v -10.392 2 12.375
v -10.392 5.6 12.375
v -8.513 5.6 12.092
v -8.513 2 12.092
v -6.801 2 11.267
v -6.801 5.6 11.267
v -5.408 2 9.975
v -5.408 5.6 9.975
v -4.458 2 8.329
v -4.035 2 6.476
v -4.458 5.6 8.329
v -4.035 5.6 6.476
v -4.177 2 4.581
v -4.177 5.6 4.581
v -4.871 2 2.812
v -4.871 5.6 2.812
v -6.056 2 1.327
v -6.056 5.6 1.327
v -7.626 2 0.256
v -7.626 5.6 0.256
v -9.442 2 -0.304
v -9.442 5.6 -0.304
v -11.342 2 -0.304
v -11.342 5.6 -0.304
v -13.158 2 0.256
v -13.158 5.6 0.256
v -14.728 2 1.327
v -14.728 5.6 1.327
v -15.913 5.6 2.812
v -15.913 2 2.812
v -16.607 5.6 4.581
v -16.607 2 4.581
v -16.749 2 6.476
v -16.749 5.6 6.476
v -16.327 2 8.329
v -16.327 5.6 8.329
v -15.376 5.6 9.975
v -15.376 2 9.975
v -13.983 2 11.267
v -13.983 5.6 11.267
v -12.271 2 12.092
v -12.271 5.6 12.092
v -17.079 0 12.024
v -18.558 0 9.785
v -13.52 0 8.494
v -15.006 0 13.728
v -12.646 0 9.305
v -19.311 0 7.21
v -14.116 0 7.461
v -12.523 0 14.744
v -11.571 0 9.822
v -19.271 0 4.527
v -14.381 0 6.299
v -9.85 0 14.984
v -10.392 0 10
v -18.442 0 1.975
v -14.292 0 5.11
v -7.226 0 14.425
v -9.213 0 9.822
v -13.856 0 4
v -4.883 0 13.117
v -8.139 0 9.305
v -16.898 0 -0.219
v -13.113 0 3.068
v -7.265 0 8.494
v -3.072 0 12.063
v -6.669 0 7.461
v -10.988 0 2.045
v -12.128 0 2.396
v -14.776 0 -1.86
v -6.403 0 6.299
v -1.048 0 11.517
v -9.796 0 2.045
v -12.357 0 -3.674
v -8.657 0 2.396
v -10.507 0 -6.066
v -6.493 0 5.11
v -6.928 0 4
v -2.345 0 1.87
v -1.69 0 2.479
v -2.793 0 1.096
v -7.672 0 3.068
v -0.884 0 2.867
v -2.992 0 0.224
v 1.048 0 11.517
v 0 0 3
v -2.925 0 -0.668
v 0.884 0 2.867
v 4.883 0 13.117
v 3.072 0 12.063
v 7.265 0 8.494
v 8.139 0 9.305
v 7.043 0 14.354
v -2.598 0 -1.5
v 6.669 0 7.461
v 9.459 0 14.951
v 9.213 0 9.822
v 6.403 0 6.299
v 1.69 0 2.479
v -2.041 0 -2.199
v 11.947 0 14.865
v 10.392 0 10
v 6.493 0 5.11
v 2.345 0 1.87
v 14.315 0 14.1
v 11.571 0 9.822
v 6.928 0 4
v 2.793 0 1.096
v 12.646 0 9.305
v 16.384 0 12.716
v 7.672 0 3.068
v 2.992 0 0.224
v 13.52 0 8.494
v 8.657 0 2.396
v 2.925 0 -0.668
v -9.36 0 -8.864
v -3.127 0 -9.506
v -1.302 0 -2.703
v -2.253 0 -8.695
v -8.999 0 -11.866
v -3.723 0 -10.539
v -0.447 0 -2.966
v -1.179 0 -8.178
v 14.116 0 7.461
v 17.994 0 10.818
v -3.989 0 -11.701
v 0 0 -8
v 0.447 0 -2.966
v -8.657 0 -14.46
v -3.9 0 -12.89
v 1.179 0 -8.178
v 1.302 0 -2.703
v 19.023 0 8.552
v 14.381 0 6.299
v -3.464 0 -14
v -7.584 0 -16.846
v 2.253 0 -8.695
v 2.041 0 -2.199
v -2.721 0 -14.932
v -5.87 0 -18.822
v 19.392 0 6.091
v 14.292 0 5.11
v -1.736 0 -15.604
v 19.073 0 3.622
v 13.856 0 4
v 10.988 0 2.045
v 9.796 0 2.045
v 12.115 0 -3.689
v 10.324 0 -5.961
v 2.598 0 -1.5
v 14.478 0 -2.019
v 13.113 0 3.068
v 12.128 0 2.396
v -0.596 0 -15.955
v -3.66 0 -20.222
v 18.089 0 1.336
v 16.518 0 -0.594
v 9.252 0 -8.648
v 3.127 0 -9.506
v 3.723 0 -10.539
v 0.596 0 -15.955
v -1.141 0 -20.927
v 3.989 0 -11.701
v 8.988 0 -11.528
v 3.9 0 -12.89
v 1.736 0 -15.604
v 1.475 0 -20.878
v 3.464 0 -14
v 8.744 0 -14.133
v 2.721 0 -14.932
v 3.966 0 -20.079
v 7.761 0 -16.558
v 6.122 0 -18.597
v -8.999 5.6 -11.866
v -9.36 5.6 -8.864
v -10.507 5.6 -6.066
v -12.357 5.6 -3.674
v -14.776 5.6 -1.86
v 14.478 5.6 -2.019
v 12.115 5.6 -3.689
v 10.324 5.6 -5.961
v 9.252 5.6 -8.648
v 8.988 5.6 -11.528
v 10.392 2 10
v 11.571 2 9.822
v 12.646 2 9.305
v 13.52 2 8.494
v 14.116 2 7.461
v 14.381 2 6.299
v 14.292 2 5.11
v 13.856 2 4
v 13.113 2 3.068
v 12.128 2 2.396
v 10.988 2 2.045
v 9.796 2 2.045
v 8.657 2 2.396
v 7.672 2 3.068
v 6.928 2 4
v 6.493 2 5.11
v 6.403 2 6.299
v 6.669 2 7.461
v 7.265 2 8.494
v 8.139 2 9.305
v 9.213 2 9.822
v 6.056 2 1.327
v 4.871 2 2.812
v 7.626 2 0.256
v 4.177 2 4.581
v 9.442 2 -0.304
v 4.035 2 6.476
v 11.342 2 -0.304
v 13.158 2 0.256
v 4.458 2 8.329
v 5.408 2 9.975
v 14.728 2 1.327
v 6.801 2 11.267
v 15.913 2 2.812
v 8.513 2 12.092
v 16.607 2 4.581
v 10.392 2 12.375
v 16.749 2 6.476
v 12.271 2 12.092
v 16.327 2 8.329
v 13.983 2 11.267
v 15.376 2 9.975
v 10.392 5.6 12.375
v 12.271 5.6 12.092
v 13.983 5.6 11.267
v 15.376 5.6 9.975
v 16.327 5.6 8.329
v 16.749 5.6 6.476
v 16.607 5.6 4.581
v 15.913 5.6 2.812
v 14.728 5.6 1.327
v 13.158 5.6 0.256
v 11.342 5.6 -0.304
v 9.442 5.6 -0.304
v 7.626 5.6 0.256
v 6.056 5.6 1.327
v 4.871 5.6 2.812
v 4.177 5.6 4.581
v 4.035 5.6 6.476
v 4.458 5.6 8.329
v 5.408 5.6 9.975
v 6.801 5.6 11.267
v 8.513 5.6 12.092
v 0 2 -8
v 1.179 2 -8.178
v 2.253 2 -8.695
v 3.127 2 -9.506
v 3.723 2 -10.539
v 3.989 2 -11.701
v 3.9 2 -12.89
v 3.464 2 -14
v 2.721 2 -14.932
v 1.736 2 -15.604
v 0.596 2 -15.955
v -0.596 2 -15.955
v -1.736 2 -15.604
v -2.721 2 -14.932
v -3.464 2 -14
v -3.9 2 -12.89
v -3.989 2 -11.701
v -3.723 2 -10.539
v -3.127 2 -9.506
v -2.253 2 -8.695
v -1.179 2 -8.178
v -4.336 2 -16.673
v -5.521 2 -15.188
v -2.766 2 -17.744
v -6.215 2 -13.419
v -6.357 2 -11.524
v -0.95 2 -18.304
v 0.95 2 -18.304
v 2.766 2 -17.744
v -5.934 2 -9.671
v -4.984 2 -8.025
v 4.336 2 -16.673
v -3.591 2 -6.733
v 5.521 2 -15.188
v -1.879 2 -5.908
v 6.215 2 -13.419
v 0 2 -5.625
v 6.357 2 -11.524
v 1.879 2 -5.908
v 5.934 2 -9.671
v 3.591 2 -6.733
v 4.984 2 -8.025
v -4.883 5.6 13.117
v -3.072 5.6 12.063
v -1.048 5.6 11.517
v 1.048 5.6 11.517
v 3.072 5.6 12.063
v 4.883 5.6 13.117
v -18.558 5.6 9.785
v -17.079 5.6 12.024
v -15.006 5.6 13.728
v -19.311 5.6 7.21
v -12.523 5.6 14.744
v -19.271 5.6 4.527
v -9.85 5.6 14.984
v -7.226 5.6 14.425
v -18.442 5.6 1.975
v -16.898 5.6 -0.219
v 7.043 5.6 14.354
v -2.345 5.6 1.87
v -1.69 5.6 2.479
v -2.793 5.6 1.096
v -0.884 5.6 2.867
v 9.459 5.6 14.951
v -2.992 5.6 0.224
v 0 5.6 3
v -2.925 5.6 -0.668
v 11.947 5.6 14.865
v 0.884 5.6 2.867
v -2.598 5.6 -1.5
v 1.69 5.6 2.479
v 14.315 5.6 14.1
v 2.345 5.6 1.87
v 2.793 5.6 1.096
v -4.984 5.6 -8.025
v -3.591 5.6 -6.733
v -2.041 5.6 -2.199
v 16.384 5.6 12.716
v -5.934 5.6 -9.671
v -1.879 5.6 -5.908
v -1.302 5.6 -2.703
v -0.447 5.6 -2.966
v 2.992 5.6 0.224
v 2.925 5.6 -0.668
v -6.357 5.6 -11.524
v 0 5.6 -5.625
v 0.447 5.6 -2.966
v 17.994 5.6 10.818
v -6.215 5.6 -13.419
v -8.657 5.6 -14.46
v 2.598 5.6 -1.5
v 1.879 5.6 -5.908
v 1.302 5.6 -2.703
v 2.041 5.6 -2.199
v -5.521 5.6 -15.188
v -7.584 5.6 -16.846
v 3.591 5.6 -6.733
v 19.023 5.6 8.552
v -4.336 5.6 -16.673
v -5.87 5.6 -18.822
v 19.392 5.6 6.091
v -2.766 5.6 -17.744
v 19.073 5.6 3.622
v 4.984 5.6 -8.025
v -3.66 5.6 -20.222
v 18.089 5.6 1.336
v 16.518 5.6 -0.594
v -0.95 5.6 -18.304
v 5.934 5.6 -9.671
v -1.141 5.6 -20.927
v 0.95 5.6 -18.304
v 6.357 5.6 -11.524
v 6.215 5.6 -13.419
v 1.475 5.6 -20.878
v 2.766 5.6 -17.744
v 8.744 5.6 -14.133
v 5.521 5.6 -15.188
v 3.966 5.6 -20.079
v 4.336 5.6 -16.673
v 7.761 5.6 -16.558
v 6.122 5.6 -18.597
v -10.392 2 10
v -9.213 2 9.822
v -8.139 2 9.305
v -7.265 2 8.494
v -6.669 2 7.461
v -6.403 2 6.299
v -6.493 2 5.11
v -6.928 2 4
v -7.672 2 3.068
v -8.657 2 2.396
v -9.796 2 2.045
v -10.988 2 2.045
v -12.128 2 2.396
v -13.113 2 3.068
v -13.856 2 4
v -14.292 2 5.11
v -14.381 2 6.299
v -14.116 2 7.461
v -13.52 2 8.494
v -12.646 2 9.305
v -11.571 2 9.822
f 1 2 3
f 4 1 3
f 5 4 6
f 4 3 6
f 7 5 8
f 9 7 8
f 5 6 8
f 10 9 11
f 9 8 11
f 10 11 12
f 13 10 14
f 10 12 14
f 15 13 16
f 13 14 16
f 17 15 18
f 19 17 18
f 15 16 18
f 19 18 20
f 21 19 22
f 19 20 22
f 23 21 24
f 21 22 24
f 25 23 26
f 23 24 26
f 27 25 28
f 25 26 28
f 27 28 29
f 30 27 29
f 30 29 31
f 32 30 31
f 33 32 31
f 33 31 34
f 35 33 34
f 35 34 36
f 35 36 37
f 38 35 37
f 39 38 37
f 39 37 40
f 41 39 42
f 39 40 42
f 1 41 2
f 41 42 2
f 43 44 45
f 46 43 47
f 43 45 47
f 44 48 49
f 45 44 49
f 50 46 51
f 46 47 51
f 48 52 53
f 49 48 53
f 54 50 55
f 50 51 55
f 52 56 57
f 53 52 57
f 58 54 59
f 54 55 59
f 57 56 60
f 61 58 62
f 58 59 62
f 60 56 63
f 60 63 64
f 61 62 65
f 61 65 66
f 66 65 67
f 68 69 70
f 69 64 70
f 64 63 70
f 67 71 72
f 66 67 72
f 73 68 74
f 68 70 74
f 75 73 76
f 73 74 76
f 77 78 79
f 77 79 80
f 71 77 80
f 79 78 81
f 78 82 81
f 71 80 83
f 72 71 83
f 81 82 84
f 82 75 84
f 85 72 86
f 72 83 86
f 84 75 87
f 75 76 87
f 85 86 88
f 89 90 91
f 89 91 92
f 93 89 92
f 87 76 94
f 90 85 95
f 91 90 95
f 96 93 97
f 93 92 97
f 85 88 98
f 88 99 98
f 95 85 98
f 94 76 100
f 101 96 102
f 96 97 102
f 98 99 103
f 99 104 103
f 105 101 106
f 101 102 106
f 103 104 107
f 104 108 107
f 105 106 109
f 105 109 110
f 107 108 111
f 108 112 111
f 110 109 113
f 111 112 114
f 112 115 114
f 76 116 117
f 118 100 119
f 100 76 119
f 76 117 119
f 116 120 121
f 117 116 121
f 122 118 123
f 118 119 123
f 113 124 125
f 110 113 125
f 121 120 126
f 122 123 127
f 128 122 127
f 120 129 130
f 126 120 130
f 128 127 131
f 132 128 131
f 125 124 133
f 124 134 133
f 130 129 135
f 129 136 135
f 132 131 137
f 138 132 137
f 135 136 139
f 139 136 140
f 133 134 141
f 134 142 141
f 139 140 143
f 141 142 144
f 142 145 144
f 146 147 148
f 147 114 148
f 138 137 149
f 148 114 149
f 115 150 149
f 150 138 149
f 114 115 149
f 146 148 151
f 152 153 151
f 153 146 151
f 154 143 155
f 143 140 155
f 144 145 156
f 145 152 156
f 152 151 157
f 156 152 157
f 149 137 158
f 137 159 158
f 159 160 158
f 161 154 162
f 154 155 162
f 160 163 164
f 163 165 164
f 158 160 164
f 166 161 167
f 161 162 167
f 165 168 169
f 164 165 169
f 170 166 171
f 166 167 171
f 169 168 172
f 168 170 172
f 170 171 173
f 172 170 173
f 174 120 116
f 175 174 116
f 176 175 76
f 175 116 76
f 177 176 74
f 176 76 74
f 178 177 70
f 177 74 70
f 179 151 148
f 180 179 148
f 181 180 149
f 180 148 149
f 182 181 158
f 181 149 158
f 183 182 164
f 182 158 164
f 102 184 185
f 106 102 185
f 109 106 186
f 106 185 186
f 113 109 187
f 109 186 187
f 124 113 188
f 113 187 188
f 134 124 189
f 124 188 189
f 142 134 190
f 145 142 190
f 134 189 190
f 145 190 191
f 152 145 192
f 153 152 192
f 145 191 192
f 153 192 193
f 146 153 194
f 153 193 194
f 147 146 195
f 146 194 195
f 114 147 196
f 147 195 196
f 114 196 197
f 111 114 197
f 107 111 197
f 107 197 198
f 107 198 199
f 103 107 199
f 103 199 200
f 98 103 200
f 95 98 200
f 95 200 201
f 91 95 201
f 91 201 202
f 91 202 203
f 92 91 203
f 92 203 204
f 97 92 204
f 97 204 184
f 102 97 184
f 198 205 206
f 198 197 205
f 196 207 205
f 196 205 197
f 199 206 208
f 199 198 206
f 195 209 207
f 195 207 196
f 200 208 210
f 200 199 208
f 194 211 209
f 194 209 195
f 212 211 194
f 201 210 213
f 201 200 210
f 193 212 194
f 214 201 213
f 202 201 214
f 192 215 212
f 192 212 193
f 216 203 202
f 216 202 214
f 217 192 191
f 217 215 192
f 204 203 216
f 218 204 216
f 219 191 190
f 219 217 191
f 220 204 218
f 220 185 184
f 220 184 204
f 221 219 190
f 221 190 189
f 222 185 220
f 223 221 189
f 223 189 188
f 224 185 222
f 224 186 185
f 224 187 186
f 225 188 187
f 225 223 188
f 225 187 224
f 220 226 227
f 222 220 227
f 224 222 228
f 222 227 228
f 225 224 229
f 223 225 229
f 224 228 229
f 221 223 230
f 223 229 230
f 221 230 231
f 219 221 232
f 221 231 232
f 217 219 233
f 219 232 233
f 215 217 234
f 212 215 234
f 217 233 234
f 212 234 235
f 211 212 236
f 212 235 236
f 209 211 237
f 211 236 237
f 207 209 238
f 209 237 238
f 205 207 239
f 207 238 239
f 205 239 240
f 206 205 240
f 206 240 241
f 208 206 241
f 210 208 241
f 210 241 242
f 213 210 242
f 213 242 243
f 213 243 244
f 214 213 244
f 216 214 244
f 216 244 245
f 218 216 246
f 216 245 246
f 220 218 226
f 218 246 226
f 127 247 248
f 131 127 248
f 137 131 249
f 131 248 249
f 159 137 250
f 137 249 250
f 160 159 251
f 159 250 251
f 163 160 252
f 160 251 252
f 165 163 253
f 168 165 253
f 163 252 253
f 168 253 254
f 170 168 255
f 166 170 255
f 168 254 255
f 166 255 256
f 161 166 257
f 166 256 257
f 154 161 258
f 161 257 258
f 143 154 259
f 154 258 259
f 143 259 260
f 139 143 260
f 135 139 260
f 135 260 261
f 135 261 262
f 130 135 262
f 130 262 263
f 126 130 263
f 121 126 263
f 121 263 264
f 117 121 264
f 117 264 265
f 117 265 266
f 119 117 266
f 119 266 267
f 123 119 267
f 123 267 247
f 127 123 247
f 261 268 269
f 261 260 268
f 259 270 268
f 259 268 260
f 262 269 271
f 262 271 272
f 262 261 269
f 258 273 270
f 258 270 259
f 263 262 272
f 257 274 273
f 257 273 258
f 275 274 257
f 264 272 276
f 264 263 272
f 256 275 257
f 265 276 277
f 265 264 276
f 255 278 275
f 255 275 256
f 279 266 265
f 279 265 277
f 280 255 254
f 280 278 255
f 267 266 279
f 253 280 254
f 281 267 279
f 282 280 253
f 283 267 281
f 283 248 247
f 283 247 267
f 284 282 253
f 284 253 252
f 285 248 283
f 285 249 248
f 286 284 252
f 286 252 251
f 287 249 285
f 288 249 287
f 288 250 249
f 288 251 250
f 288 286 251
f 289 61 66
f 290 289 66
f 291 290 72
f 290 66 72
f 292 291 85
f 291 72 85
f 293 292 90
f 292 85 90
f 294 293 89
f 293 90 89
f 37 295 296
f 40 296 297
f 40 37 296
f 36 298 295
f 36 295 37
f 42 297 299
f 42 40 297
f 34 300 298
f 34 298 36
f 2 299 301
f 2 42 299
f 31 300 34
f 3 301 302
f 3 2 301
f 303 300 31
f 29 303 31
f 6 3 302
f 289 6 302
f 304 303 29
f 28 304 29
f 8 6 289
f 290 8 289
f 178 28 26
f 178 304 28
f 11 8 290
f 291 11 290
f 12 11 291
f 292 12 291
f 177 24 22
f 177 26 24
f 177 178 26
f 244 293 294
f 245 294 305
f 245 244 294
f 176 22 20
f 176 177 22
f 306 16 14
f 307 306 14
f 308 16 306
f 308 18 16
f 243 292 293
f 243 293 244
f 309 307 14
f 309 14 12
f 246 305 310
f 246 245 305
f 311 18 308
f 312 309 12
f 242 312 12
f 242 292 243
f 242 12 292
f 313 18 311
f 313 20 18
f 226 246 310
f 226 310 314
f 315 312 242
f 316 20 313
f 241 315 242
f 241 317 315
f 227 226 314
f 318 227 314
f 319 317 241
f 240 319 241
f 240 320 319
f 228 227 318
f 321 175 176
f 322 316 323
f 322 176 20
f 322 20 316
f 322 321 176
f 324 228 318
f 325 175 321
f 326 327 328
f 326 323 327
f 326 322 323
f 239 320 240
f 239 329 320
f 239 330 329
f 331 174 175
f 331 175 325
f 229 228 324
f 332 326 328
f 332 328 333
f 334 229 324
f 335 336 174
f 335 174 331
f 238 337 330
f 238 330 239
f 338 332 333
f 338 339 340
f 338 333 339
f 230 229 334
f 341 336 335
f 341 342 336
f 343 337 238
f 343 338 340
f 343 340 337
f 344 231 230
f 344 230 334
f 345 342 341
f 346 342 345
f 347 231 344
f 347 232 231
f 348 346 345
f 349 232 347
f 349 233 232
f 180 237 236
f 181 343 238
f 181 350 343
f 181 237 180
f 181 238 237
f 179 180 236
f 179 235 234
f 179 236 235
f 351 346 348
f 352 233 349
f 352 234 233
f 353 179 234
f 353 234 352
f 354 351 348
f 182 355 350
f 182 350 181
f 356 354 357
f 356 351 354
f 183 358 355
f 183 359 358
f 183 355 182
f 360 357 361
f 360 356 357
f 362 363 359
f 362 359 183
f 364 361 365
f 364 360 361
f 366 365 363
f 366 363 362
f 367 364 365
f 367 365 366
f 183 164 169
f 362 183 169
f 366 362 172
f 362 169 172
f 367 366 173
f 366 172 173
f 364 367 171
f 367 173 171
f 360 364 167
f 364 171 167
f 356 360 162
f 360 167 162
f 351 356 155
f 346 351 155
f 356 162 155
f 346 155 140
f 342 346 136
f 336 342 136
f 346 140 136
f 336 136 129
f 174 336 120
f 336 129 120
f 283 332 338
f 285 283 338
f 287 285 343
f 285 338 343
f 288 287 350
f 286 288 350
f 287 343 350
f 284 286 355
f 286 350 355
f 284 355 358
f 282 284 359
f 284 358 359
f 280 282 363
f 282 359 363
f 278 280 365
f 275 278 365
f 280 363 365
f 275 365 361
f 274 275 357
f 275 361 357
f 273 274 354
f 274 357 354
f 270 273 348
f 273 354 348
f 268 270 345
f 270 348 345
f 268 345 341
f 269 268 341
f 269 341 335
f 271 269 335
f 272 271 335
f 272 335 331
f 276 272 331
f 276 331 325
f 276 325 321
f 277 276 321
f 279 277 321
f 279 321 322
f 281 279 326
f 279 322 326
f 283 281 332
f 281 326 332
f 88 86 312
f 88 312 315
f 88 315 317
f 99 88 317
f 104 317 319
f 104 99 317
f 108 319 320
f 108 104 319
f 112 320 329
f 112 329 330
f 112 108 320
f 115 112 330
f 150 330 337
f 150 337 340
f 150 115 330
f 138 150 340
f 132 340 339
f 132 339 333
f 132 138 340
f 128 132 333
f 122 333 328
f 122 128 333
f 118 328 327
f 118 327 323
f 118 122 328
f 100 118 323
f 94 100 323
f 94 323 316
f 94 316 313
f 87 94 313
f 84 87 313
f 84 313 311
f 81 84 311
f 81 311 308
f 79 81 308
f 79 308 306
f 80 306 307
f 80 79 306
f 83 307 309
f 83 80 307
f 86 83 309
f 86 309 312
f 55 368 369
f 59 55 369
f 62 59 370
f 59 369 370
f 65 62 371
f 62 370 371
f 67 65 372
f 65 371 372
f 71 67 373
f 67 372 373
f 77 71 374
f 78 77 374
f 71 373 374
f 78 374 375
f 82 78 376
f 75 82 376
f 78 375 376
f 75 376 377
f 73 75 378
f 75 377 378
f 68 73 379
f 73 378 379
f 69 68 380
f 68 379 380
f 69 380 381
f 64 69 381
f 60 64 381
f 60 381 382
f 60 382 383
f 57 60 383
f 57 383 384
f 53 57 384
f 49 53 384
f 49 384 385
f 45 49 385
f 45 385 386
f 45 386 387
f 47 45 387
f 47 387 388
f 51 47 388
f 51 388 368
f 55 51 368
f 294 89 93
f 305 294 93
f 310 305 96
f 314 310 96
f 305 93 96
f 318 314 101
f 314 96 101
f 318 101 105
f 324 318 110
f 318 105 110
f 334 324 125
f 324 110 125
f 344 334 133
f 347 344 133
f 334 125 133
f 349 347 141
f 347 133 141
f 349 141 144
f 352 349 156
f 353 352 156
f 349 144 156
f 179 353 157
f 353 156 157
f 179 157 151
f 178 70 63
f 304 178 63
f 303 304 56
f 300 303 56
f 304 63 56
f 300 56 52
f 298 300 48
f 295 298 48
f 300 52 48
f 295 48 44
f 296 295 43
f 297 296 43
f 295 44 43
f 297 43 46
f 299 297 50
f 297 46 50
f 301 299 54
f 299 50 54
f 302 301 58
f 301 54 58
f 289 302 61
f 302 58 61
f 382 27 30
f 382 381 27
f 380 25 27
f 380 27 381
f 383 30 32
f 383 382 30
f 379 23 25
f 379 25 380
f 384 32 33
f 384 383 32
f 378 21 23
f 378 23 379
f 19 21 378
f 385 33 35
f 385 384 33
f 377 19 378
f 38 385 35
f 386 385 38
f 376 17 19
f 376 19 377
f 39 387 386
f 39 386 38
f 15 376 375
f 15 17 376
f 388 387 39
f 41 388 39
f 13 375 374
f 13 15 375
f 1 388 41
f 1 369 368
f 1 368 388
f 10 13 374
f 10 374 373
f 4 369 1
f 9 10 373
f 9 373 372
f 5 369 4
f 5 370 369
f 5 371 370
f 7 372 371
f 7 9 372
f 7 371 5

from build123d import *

# Parameters (mm, degrees)
SKETCH1_R           = 3
SKETCH1_R_2         = 6.375
BOSS_EXTRUDE1_DEPTH = 5.6
SKETCH2_R           = 6.375
CUT_EXTRUDE1_DEPTH  = 3.6
SKETCH3_R           = 4
CUT_EXTRUDE2_DEPTH  = 29.810093495


with BuildPart() as part:
    # Sketch1 → Boss-Extrude1 (new body)
    # profile 1 of 4: a face of its own
    with BuildSketch(Plane(origin=(0, 0, 0), x_dir=(1, 0, 0), z_dir=(0, 1, 0))):
        with BuildLine():
            ThreePointArc((-14.775889156, 1.860291889), (-17.90204805, -10.960217435), (-4.883341128, -13.116973989))
            ThreePointArc((-4.883341128, -13.116973989), (0, -11.447792844), (4.883341128, -13.116973989))
            ThreePointArc((4.883341128, -13.116973989), (17.993886057, -10.818294624), (14.477584826, 2.019381989))
            ThreePointArc((14.477584826, 2.019381989), (10.324072295, 5.960605919), (8.987628515, 11.52826525))
            ThreePointArc((8.987628515, 11.52826525), (0.169037816, 20.998412428), (-8.999004613, 11.866149428))
            ThreePointArc((-8.999004613, 11.866149428), (-10.506960828, 6.066196663), (-14.775889156, 1.860291889))
        make_face()
        with Locations(Location((0, 0, 0), (0, 0, 270))):
            Circle(SKETCH1_R, mode=Mode.SUBTRACT)
        with Locations((0, 12)):
            Circle(SKETCH1_R_2, mode=Mode.SUBTRACT)
        with Locations((10.392304845, -6)):
            Circle(SKETCH1_R_2, mode=Mode.SUBTRACT)
        with Locations((-10.392304845, -6)):
            Circle(SKETCH1_R_2, mode=Mode.SUBTRACT)
    # profile 2 of 4: a face of its own
    with BuildSketch(Plane(origin=(0, 0, 0), x_dir=(1, 0, 0), z_dir=(0, 1, 0))):
        with Locations((0, 12)):
            Circle(SKETCH1_R_2)
    # profile 3 of 4: a face of its own
    with BuildSketch(Plane(origin=(0, 0, 0), x_dir=(1, 0, 0), z_dir=(0, 1, 0))):
        with Locations((10.392304845, -6)):
            Circle(SKETCH1_R_2)
    # profile 4 of 4: a face of its own
    with BuildSketch(Plane(origin=(0, 0, 0), x_dir=(1, 0, 0), z_dir=(0, 1, 0))):
        with Locations((-10.392304845, -6)):
            Circle(SKETCH1_R_2)
    extrude(amount=BOSS_EXTRUDE1_DEPTH)

    # Sketch2 → Cut-Extrude1 (cut)
    with BuildSketch(Plane(origin=(0, 5.6, 0), x_dir=(1, 0, 0), z_dir=(0, 1, 0))):
        with Locations(Location((-10.392304845, -6, 0), (0, 0, 270))):
            Circle(SKETCH2_R)
        with Locations(Location((0, 12, 0), (0, 0, 270))):
            Circle(SKETCH2_R)
        with Locations(Location((10.392304845, -6, 0), (0, 0, 270))):
            Circle(SKETCH2_R)
    extrude(amount=-CUT_EXTRUDE1_DEPTH, mode=Mode.SUBTRACT)

    # Sketch3 → Cut-Extrude2 (cut, through all)
    with BuildSketch(Plane(origin=(0, 2, 0), x_dir=(1, 0, 0), z_dir=(0, 1, 0))):
        with Locations(Location((-10.392304845, -6, 0), (0, 0, 270))):
            Circle(SKETCH3_R)
        with Locations(Location((0, 12, 0), (0, 0, 270))):
            Circle(SKETCH3_R)
        with Locations(Location((10.392304845, -6, 0), (0, 0, 270))):
            Circle(SKETCH3_R)
    extrude(amount=-CUT_EXTRUDE2_DEPTH, mode=Mode.SUBTRACT)


solid = part.part
